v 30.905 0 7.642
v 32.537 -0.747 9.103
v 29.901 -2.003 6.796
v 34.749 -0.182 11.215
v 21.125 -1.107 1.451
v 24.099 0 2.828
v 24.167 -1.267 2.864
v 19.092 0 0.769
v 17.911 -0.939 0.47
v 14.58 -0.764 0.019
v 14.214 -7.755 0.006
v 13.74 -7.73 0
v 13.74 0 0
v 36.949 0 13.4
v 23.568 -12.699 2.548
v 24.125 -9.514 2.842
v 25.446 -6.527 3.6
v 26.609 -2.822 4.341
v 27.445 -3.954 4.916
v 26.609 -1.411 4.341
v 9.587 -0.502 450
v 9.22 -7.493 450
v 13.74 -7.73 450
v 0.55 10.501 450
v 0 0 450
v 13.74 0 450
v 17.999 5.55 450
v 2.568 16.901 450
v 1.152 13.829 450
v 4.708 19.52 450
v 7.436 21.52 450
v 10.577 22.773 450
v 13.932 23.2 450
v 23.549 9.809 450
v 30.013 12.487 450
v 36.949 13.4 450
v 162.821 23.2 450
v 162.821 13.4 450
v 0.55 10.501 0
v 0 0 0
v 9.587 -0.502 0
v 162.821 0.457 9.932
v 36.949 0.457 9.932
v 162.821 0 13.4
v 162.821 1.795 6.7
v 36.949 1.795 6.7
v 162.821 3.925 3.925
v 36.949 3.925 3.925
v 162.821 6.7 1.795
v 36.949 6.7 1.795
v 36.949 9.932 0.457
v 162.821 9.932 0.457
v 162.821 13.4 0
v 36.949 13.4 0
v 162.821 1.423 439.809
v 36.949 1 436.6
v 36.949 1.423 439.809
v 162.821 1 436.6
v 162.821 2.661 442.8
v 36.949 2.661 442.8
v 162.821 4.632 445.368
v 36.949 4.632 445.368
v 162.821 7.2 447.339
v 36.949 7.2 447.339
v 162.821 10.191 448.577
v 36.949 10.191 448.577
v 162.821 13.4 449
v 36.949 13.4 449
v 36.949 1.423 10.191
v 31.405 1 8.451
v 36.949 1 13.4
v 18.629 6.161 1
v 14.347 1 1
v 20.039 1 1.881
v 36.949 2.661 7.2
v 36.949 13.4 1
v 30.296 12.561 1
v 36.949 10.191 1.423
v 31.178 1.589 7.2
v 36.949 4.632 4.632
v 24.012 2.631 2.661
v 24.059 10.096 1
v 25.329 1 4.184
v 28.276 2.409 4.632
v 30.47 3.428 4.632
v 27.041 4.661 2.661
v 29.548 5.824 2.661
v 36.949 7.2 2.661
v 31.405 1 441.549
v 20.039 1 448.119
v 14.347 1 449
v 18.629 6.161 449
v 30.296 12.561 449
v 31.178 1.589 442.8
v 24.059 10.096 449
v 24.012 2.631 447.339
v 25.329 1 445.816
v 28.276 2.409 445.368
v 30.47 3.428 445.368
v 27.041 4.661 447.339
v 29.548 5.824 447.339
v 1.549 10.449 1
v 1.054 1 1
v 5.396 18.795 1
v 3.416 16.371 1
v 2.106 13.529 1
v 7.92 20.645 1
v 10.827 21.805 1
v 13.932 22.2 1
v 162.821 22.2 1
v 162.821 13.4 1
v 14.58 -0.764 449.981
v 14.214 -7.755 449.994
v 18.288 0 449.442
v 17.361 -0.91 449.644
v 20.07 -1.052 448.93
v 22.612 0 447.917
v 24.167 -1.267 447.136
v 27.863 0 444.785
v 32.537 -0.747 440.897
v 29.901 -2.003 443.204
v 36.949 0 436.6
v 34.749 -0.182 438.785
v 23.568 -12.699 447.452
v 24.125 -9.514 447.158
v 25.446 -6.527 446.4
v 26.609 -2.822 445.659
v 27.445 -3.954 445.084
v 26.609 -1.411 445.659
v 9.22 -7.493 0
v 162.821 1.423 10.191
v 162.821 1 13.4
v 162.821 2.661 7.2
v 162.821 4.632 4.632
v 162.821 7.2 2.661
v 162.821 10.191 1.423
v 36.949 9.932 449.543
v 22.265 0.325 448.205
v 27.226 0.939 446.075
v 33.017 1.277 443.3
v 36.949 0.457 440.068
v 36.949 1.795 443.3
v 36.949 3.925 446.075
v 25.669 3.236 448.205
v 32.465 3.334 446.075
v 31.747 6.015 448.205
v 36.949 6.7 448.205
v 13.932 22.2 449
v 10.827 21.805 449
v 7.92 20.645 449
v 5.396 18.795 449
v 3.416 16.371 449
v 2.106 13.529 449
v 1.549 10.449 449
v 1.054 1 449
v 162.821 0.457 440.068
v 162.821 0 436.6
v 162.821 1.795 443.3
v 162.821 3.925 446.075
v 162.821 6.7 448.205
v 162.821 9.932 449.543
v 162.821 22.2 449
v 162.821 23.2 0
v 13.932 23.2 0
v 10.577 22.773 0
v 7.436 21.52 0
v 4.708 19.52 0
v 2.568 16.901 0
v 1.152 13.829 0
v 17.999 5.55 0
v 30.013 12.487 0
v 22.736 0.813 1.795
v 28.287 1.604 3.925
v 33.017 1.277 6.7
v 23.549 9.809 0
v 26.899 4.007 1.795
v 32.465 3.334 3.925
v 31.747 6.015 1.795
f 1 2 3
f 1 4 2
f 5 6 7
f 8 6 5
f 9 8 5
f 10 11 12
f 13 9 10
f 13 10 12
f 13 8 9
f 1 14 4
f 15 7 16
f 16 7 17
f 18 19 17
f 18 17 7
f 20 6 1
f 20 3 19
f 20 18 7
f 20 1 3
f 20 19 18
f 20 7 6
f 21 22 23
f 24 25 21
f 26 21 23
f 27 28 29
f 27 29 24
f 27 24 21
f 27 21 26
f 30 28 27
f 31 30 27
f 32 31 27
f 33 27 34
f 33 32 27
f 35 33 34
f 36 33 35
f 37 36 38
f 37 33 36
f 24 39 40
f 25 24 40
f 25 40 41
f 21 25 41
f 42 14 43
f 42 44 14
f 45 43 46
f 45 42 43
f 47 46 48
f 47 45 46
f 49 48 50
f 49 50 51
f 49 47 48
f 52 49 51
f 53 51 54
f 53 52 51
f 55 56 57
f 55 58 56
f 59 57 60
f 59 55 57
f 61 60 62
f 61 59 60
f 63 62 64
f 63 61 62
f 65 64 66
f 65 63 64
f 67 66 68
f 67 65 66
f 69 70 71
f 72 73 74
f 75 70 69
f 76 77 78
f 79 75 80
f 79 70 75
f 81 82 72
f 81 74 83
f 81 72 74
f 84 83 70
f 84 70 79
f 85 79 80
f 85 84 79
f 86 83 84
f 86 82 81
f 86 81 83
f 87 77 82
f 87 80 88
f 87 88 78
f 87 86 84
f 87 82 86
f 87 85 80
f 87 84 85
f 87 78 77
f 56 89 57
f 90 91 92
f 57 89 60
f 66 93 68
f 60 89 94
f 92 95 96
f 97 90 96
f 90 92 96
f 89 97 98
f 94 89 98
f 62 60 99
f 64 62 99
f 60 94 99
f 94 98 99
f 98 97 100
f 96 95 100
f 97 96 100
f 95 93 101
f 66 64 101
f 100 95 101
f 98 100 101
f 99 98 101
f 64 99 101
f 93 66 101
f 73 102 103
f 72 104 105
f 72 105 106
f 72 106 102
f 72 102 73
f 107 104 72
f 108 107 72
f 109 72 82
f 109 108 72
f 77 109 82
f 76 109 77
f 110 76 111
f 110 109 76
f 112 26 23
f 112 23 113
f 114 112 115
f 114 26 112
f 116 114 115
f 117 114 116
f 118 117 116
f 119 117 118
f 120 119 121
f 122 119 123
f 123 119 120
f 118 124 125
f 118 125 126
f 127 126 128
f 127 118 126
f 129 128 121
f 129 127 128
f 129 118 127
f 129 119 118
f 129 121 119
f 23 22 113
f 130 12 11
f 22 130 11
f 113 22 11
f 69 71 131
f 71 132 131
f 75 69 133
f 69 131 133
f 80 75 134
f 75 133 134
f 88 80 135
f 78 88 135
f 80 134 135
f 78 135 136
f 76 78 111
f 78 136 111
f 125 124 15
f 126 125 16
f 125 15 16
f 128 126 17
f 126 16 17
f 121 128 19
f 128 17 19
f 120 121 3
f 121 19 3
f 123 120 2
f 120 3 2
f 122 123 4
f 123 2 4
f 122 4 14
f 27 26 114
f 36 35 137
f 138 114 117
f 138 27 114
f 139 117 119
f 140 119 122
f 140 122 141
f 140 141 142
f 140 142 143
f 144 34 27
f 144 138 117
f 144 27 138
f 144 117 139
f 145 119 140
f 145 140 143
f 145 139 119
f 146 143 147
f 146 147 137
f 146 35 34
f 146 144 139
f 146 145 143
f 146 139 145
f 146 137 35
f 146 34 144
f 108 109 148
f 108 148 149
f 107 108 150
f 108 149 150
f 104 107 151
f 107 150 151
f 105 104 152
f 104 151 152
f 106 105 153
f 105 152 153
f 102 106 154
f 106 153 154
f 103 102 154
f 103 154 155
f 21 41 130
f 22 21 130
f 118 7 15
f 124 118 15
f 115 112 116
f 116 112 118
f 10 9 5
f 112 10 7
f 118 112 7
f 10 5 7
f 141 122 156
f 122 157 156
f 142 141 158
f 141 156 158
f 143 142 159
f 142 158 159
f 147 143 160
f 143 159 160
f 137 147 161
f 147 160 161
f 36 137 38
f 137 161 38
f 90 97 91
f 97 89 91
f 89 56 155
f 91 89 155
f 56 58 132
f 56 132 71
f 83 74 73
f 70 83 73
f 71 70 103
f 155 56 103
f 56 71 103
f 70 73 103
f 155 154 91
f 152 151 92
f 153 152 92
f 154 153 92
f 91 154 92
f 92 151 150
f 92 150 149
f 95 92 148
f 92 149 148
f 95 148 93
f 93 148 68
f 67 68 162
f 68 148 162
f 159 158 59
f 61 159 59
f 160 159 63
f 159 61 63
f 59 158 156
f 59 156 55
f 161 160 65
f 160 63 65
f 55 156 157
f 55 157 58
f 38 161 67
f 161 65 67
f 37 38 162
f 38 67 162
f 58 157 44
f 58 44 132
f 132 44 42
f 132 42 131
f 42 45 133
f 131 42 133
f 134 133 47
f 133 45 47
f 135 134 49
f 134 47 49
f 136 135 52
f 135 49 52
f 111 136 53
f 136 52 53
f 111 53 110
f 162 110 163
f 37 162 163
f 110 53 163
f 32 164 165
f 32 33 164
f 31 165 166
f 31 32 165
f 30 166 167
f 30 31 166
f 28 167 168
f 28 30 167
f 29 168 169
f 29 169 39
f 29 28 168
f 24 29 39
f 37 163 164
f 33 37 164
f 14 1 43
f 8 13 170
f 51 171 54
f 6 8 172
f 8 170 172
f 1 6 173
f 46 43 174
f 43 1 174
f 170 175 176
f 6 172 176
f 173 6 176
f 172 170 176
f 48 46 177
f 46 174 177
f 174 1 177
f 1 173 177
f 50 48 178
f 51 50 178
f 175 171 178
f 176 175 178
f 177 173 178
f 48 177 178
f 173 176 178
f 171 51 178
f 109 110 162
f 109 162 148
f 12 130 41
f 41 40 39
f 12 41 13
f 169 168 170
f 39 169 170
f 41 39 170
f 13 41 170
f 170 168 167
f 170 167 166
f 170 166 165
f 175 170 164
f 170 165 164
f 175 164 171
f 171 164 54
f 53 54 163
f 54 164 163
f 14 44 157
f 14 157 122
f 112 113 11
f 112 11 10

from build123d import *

# Parameters (mm, degrees)
BOSS_EXTRUDE1_DEPTH = 450
FILLET1_R           = 13.4
BOSS_EXTRUDE2_DEPTH = 450
FILLET2_R           = 13.4
CUT_EXTRUDE1_DEPTH  = 451.0000001
SHELL1_T            = -1
BOSS_EXTRUDE3_DEPTH = 450
CUT_EXTRUDE2_DEPTH  = 13.698698186


with BuildPart() as part:
    # Sketch2 → Boss-Extrude1 (new body)
    with BuildSketch(Plane.XY):
        Polygon((0, 0), (162.820860479, 0), (162.820860479, 23.2), (1.215860479, 23.2), align=None)
    extrude(amount=BOSS_EXTRUDE1_DEPTH)

    # Fillet1
    fillet1_edges = [part.edges().sort_by_distance(p)[0] for p in [
        (1.215860479, 23.2, 225),
    ]]
    fillet(fillet1_edges, radius=FILLET1_R)

    # Sketch4 → Boss-Extrude2 (add, through all)
    with BuildSketch(Plane.XY.offset(450)):
        with BuildLine():
            Line((24.166834741, -1.266530141), (23.567700201, -12.698698186))
            ThreePointArc((23.567700201, -12.698698186), (27.725384653, -3.679983428), (36.949335967, 0))
            Line((36.949335967, 0), (0, 0))
            Line((0, 0), (9.586843534, -0.50242518))
            Line((9.586843534, -0.50242518), (9.22049184, -7.492831923))
            Line((9.22049184, -7.492831923), (14.213639514, -7.754511704))
            Line((14.213639514, -7.754511704), (14.579991207, -0.764104961))
            Line((14.579991207, -0.764104961), (24.166834741, -1.266530141))
        make_face()
    extrude(amount=-BOSS_EXTRUDE2_DEPTH)

    # Fillet2
    fillet2_edges = [part.edges().sort_by_distance(p)[0] for p in [
        (27.725384653, -3.679983428, 0),
        (27.725384653, -3.679983428, 450),
        (99.885098223, 0, 450),
        (99.885098223, 0, 0),
    ]]
    fillet(fillet2_edges, radius=FILLET2_R)

    # Sketch5 → Cut-Extrude1 (cut, through all)
    with BuildSketch(Plane.XY):
        with BuildLine():
            Line((24.166834741, -1.266530141), (23.567700201, -12.698698186))
            ThreePointArc((23.567700201, -12.698698186), (27.725384653, -3.679983428), (36.949335967, 0))
            Line((36.949335967, 0), (0, 0))
            Line((0, 0), (9.586843534, -0.50242518))
            Line((9.586843534, -0.50242518), (9.22049184, -7.492831923))
            Line((9.22049184, -7.492831923), (14.213639514, -7.754511704))
            Line((14.213639514, -7.754511704), (14.579991207, -0.764104961))
            Line((14.579991207, -0.764104961), (24.166834741, -1.266530141))
        make_face()
    extrude(amount=CUT_EXTRUDE1_DEPTH, mode=Mode.SUBTRACT)

    # Shell1
    shell1_openings = [part.faces().sort_by_distance(p)[0] for p in [
        (162.820860479, 11.274923044, 225),
    ]]
    offset(amount=SHELL1_T, openings=shell1_openings)

    # Sketch6 → Boss-Extrude3 (add)
    with BuildSketch(Plane.XY):
        with BuildLine():
            Line((24.166834741, -1.266530141), (23.567700201, -12.698698186))
            ThreePointArc((23.567700201, -12.698698186), (27.725384653, -3.679983428), (36.949335967, 0))
            Line((36.949335967, 0), (0, 0))
            Line((0, 0), (9.586843534, -0.50242518))
            Line((9.586843534, -0.50242518), (9.22049184, -7.492831923))
            Line((9.22049184, -7.492831923), (14.213639514, -7.754511704))
            Line((14.213639514, -7.754511704), (14.579991207, -0.764104961))
            Line((14.579991207, -0.764104961), (24.166834741, -1.266530141))
        make_face()
    extrude(amount=BOSS_EXTRUDE3_DEPTH)

    # Sketch7 → Cut-Extrude2 (cut, through all)
    with BuildSketch(Plane.XZ):
        with BuildLine():
            Line((13.739855146, 450), (36.949335967, 450))
            Line((36.949335967, 450), (36.949335967, 436.6))
            add(Edge.make_bspline(
                [(13.739855146, 450), (14.897031698, 450), (16.037346218, 449.888583323), (17.726143963, 449.5782461), (18.285436938, 449.450751492), (19.397111441, 449.150094553), (19.951343846, 448.976153087), (22.667401959, 448.011694289), (24.688899416, 446.937288096), (27.088419743, 445.339458648), (27.560915156, 445.007570641), (28.487586558, 444.326213533), (28.942650844, 443.976156414), (30.286745236, 442.902062513), (31.15469064, 442.154118787), (32.853186658, 440.615831161), (33.683710559, 439.825456971), (35.32594722, 438.223379533), (36.139219776, 437.410115889), (36.949335967, 436.6)],
                knots=[0, 0, 0, 0, 0.125, 0.125, 0.1875, 0.1875, 0.25, 0.25, 0.5, 0.5, 0.5625, 0.5625, 0.625, 0.625, 0.75, 0.75, 0.875, 0.875, 1, 1, 1, 1], degree=3))
        make_face()
        with BuildLine():
            Line((36.949335967, 13.4), (36.949335967, 0))
            Line((36.949335967, 0), (13.739855146, 0))
            add(Edge.make_bspline(
                [(36.949335967, 13.4), (36.139219776, 12.589884111), (35.32594722, 11.776620467), (33.683710559, 10.174543029), (32.853186658, 9.384168839), (31.15469064, 7.845881213), (30.286745236, 7.097937487), (28.942650844, 6.023843586), (28.487586558, 5.673786467), (27.560915156, 4.992429359), (27.088419743, 4.660541352), (24.688899416, 3.062711904), (22.667401959, 1.988305711), (19.951343846, 1.023846913), (19.397111441, 0.849905447), (18.285436938, 0.549248508), (17.726143963, 0.4217539), (16.037346218, 0.111416677), (14.897031698, 0), (13.739855146, 0)],
                knots=[0, 0, 0, 0, 0.125, 0.125, 0.25, 0.25, 0.375, 0.375, 0.4375, 0.4375, 0.5, 0.5, 0.75, 0.75, 0.8125, 0.8125, 0.875, 0.875, 1, 1, 1, 1], degree=3))
        make_face()
    extrude(amount=CUT_EXTRUDE2_DEPTH, mode=Mode.SUBTRACT)


solid = part.part
